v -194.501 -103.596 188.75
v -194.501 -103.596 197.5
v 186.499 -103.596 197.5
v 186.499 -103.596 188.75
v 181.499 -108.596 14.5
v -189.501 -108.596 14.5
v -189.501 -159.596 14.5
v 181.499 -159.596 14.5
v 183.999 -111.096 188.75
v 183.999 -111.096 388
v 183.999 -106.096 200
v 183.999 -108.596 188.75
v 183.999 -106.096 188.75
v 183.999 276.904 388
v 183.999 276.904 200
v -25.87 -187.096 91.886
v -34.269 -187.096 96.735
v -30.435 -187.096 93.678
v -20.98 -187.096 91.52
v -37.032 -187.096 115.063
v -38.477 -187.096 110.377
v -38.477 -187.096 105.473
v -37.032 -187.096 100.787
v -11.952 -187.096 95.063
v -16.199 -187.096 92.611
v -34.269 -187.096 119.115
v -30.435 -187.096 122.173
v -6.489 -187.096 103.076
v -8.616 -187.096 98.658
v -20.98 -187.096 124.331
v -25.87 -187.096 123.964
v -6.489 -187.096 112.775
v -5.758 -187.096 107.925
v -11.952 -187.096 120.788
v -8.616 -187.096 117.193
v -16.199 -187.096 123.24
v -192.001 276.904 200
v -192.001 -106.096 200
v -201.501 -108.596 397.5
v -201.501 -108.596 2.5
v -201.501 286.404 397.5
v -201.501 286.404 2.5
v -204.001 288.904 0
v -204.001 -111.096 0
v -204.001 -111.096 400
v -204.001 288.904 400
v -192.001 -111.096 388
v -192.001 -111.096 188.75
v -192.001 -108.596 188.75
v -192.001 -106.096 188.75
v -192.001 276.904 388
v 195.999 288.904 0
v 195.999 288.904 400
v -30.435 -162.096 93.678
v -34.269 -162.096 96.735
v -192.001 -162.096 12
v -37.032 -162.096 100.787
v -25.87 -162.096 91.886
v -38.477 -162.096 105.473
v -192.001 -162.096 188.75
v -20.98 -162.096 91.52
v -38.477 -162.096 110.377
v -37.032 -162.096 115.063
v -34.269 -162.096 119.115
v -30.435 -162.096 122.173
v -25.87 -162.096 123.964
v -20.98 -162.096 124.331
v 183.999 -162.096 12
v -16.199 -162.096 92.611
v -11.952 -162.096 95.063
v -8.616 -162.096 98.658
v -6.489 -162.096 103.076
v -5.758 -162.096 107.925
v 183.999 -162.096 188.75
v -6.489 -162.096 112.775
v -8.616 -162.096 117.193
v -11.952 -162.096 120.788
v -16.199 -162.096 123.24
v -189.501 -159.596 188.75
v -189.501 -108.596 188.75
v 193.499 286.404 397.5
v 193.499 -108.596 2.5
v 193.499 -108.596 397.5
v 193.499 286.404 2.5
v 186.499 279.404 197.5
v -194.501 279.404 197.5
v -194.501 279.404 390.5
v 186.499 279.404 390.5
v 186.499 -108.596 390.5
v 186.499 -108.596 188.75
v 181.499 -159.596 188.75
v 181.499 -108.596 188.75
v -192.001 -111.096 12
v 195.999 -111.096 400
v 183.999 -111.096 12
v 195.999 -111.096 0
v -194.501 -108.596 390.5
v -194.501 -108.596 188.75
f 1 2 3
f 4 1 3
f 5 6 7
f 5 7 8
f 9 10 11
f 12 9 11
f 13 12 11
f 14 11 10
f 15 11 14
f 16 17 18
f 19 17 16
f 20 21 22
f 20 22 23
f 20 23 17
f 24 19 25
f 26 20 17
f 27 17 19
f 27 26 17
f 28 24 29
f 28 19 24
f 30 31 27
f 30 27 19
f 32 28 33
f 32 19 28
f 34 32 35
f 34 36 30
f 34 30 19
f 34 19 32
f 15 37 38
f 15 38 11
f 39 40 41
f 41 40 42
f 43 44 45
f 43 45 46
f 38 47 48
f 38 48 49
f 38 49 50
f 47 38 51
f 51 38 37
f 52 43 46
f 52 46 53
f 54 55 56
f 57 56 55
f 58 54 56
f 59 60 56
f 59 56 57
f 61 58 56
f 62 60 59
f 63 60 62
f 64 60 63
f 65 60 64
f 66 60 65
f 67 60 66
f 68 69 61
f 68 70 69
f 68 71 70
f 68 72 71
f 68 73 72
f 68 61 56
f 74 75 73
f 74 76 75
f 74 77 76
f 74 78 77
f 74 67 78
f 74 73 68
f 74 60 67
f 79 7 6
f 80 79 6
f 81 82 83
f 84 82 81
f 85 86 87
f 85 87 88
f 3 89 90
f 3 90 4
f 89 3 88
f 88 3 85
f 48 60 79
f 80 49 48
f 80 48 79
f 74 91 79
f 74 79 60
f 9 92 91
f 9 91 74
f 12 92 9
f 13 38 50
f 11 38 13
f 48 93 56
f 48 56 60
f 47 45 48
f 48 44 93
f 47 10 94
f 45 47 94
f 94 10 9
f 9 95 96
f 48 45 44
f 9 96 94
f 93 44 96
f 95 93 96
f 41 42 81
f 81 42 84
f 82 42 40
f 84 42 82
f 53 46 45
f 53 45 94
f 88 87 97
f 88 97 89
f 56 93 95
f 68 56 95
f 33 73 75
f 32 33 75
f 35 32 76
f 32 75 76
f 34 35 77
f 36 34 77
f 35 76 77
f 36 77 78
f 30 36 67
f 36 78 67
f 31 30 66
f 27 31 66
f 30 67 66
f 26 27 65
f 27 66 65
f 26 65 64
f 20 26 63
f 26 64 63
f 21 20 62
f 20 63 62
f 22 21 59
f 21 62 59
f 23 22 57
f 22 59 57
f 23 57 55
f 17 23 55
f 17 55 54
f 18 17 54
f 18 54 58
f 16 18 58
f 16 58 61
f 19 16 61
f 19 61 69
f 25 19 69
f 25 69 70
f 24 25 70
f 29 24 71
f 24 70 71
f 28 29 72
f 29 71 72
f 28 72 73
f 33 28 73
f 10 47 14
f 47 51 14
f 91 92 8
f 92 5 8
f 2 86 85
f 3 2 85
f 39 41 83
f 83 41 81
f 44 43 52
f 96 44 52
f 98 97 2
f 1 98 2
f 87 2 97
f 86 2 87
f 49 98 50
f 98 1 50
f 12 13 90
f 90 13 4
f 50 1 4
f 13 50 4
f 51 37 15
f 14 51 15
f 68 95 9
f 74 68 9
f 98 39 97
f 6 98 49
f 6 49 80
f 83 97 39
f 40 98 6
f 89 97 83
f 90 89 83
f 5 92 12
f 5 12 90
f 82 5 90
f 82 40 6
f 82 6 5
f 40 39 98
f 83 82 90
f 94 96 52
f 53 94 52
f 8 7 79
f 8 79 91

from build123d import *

# Parameters (mm, degrees)
F0_W      = 400
F0_H      = 400
F1_DEPTH  = 400
F2_T      = -12
F4_W      = 376
F4_H      = 11.2500011921
F5_DEPTH  = 383
F6_W      = 376
F6_H      = 176.7499988079
F7_DEPTH  = 439
F8_T      = -2.5
F9_R      = 16.4515915788
F10_DEPTH = 25


# Not quite as in the source:
# - a shell that OpenCascade refuses in one call is made with other operations: the cavity is built on its own and cut out


with BuildPart() as f1:
    # F0 (on Top) → F1 (new body)
    with BuildSketch(Plane.XY):
        with Locations((-4.0007606149, 88.9041203893)):
            Rectangle(F0_W, F0_H)
    extrude(amount=F1_DEPTH)

    # F2
    f2_openings = [f1.faces().sort_by_distance(p)[0] for p in [
        (-4.000761, -111.09588, 200),
    ]]
    offset(amount=F2_T, openings=f2_openings)

    # F4 (on face) → F5 (join)
    with BuildSketch(Plane.XZ.offset(-276.9041203893)):
        with Locations((-4.0007606149, 194.374999404)):
            Rectangle(F4_W, F4_H)
    extrude(amount=F5_DEPTH)

    # F6 (on face) → F7 (join)
    with BuildSketch(Plane.XZ.offset(-276.9041203893)):
        with Locations((-4.0007606149, 100.374999404)):
            Rectangle(F6_W, F6_H)
    extrude(amount=F7_DEPTH)

    # F8: a shell. OpenCascade refuses it in one call, so the cavity is built on its own and cut out:
    # the body offset inwards by the wall thickness, plus a prism from it out through each open face.
    f8_core = offset(f1.part, amount=F8_T, kind=Kind.INTERSECTION, mode=Mode.PRIVATE)
    f8_exits = [f8_core.faces().sort_by_distance(p)[0] for p in [
        (-4.000761, -131.534658, 186.249999),
    ]]
    add(f8_core, mode=Mode.SUBTRACT)
    extrude(f8_exits, amount=-F8_T, mode=Mode.SUBTRACT)

    # F9 (on face) → F10 (join)
    with BuildSketch(Plane.XZ.offset(162.0958796107)):
        with Locations((-22.2093164921, 107.9253256321)):
            Circle(F9_R)
    extrude(amount=F10_DEPTH)


solid = f1.part
